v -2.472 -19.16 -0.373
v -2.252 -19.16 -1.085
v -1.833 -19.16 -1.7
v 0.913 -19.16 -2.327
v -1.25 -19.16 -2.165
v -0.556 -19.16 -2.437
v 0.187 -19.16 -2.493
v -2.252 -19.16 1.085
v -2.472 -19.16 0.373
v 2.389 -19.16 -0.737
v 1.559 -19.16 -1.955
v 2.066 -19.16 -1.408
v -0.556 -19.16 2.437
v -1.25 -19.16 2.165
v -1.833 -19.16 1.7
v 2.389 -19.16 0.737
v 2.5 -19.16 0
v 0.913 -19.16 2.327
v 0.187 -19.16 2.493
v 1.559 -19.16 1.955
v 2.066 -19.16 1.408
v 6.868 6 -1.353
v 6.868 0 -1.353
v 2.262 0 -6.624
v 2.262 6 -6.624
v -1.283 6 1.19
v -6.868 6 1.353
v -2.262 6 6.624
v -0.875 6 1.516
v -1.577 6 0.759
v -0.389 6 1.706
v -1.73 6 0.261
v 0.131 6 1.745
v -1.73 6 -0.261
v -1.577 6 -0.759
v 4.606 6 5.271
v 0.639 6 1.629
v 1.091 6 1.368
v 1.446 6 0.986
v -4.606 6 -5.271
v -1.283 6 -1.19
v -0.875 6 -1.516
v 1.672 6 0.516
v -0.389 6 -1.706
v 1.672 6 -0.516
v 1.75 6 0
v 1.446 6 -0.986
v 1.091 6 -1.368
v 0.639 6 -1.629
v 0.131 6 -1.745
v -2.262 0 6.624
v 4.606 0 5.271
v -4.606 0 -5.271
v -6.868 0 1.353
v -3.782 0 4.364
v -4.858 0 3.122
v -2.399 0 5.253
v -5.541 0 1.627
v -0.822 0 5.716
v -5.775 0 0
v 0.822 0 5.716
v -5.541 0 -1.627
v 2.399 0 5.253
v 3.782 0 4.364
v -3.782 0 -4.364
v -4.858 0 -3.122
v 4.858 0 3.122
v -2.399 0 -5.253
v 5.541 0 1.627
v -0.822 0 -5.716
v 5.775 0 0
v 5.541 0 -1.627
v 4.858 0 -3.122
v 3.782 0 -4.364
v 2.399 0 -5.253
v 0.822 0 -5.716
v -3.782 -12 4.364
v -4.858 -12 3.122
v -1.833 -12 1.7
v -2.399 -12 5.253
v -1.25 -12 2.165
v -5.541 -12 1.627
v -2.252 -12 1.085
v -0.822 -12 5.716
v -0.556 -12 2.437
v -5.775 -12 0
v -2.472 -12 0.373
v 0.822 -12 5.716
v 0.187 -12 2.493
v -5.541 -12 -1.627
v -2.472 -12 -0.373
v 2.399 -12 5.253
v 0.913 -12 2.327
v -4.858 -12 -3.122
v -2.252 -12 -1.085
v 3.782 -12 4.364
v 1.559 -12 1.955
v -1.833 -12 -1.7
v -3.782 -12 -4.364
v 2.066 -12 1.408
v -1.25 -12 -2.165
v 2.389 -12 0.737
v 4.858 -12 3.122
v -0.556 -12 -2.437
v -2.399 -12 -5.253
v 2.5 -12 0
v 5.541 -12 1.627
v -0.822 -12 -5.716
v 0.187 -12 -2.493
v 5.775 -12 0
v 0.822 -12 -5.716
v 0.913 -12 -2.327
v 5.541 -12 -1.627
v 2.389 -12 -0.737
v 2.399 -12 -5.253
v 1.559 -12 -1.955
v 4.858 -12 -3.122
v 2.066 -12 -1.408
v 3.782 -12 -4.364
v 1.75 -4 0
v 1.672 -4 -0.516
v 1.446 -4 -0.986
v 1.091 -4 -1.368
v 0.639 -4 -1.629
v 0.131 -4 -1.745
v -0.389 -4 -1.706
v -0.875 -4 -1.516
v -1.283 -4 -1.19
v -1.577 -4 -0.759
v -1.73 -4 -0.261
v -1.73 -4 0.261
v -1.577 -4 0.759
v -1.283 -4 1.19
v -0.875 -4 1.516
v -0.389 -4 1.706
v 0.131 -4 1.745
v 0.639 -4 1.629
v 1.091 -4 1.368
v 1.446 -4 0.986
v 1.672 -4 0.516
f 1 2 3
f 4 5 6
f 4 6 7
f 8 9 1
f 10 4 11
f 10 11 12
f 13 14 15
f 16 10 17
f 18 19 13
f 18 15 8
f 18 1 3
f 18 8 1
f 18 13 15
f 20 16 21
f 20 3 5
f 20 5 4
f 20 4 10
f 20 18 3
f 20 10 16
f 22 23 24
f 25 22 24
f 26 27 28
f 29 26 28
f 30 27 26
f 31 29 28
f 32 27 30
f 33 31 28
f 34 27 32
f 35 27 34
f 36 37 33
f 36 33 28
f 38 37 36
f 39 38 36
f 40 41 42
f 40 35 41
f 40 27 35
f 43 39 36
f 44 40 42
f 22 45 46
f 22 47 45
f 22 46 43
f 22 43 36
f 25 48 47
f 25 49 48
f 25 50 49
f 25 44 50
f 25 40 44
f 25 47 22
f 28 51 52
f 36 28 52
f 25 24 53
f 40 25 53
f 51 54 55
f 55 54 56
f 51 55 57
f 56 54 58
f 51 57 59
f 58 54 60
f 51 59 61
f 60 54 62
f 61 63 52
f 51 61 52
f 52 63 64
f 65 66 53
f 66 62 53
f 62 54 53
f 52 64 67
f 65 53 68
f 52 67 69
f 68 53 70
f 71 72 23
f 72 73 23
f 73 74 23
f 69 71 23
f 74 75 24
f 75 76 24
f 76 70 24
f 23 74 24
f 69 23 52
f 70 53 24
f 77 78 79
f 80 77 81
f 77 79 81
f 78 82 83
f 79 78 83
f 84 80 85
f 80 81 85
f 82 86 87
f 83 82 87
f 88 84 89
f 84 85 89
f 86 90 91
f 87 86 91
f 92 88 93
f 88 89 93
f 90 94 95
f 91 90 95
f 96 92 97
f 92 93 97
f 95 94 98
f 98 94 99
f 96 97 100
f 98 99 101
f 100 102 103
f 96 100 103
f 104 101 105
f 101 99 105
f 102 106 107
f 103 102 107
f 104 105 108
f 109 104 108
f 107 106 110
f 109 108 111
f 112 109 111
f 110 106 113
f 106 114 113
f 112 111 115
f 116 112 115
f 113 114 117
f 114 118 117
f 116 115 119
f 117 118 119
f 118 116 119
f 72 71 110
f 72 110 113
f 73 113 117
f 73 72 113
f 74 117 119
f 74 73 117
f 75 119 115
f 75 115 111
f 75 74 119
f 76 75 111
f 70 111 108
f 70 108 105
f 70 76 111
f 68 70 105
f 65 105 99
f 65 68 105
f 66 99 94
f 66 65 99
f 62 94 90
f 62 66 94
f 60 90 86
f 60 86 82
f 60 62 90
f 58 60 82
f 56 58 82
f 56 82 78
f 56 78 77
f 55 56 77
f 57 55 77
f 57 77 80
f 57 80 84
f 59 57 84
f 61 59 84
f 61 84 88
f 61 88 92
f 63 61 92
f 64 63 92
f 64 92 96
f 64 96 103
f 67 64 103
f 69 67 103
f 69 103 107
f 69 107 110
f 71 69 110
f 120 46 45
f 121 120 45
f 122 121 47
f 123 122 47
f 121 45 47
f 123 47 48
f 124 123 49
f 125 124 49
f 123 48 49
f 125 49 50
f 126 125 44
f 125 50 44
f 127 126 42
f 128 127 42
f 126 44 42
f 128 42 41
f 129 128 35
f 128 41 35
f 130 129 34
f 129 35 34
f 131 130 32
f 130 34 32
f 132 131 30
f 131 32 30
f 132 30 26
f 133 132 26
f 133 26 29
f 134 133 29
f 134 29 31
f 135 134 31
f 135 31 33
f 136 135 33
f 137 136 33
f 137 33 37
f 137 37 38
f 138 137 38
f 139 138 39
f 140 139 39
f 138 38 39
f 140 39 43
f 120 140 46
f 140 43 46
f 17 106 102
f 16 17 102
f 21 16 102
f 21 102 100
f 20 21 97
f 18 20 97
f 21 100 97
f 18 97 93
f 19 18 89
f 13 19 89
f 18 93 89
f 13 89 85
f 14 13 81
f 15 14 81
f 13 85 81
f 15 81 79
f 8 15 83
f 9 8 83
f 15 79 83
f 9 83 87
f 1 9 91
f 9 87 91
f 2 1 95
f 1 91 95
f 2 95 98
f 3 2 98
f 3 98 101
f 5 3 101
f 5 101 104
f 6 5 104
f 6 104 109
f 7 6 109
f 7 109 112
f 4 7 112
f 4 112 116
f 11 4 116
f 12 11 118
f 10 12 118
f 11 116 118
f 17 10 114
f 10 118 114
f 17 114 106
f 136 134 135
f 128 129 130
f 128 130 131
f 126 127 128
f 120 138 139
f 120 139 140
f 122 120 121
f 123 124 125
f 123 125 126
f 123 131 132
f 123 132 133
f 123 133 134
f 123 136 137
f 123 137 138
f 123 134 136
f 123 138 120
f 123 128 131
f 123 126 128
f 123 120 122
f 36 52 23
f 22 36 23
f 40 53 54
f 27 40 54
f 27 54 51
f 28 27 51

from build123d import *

# Parameters (mm, degrees)
BOSS_EXTRUDE1_DEPTH = 6
SKETCH2_R           = 5.775
BOSS_EXTRUDE2_DEPTH = 18
SKETCH3_R           = 2.5
BOSS_EXTRUDE3_DEPTH = 7.16
SKETCH4_R           = 1.75
CUT_EXTRUDE1_DEPTH  = 10


with BuildPart() as part:
    # Sketch1 → Boss-Extrude1 (new body)
    with BuildSketch(Plane(origin=(0, 0, 0), x_dir=(1, 0, 0), z_dir=(0, 1, 0))):
        Polygon((4.605908032, -5.271205859), (6.867952198, 1.353230434), (2.262044166, 6.624436292), (-4.605908032, 5.271205859), (-6.867952198, -1.353230434), (-2.262044166, -6.624436292), align=None)
    extrude(amount=BOSS_EXTRUDE1_DEPTH)

    # Sketch2 → Boss-Extrude2 (add)
    with BuildSketch(Plane(origin=(0, 6, 0), x_dir=(1, 0, 0), z_dir=(0, 1, 0))):
        Circle(SKETCH2_R)
    extrude(amount=-BOSS_EXTRUDE2_DEPTH)

    # Sketch3 → Boss-Extrude3 (add)
    with BuildSketch(Plane.XZ.offset(12)):
        Circle(SKETCH3_R)
    extrude(amount=BOSS_EXTRUDE3_DEPTH)

    # Sketch4 → Cut-Extrude1 (cut)
    with BuildSketch(Plane(origin=(0, 6, 0), x_dir=(1, 0, 0), z_dir=(0, 1, 0))):
        Circle(SKETCH4_R)
    extrude(amount=-CUT_EXTRUDE1_DEPTH, mode=Mode.SUBTRACT)


solid = part.part
